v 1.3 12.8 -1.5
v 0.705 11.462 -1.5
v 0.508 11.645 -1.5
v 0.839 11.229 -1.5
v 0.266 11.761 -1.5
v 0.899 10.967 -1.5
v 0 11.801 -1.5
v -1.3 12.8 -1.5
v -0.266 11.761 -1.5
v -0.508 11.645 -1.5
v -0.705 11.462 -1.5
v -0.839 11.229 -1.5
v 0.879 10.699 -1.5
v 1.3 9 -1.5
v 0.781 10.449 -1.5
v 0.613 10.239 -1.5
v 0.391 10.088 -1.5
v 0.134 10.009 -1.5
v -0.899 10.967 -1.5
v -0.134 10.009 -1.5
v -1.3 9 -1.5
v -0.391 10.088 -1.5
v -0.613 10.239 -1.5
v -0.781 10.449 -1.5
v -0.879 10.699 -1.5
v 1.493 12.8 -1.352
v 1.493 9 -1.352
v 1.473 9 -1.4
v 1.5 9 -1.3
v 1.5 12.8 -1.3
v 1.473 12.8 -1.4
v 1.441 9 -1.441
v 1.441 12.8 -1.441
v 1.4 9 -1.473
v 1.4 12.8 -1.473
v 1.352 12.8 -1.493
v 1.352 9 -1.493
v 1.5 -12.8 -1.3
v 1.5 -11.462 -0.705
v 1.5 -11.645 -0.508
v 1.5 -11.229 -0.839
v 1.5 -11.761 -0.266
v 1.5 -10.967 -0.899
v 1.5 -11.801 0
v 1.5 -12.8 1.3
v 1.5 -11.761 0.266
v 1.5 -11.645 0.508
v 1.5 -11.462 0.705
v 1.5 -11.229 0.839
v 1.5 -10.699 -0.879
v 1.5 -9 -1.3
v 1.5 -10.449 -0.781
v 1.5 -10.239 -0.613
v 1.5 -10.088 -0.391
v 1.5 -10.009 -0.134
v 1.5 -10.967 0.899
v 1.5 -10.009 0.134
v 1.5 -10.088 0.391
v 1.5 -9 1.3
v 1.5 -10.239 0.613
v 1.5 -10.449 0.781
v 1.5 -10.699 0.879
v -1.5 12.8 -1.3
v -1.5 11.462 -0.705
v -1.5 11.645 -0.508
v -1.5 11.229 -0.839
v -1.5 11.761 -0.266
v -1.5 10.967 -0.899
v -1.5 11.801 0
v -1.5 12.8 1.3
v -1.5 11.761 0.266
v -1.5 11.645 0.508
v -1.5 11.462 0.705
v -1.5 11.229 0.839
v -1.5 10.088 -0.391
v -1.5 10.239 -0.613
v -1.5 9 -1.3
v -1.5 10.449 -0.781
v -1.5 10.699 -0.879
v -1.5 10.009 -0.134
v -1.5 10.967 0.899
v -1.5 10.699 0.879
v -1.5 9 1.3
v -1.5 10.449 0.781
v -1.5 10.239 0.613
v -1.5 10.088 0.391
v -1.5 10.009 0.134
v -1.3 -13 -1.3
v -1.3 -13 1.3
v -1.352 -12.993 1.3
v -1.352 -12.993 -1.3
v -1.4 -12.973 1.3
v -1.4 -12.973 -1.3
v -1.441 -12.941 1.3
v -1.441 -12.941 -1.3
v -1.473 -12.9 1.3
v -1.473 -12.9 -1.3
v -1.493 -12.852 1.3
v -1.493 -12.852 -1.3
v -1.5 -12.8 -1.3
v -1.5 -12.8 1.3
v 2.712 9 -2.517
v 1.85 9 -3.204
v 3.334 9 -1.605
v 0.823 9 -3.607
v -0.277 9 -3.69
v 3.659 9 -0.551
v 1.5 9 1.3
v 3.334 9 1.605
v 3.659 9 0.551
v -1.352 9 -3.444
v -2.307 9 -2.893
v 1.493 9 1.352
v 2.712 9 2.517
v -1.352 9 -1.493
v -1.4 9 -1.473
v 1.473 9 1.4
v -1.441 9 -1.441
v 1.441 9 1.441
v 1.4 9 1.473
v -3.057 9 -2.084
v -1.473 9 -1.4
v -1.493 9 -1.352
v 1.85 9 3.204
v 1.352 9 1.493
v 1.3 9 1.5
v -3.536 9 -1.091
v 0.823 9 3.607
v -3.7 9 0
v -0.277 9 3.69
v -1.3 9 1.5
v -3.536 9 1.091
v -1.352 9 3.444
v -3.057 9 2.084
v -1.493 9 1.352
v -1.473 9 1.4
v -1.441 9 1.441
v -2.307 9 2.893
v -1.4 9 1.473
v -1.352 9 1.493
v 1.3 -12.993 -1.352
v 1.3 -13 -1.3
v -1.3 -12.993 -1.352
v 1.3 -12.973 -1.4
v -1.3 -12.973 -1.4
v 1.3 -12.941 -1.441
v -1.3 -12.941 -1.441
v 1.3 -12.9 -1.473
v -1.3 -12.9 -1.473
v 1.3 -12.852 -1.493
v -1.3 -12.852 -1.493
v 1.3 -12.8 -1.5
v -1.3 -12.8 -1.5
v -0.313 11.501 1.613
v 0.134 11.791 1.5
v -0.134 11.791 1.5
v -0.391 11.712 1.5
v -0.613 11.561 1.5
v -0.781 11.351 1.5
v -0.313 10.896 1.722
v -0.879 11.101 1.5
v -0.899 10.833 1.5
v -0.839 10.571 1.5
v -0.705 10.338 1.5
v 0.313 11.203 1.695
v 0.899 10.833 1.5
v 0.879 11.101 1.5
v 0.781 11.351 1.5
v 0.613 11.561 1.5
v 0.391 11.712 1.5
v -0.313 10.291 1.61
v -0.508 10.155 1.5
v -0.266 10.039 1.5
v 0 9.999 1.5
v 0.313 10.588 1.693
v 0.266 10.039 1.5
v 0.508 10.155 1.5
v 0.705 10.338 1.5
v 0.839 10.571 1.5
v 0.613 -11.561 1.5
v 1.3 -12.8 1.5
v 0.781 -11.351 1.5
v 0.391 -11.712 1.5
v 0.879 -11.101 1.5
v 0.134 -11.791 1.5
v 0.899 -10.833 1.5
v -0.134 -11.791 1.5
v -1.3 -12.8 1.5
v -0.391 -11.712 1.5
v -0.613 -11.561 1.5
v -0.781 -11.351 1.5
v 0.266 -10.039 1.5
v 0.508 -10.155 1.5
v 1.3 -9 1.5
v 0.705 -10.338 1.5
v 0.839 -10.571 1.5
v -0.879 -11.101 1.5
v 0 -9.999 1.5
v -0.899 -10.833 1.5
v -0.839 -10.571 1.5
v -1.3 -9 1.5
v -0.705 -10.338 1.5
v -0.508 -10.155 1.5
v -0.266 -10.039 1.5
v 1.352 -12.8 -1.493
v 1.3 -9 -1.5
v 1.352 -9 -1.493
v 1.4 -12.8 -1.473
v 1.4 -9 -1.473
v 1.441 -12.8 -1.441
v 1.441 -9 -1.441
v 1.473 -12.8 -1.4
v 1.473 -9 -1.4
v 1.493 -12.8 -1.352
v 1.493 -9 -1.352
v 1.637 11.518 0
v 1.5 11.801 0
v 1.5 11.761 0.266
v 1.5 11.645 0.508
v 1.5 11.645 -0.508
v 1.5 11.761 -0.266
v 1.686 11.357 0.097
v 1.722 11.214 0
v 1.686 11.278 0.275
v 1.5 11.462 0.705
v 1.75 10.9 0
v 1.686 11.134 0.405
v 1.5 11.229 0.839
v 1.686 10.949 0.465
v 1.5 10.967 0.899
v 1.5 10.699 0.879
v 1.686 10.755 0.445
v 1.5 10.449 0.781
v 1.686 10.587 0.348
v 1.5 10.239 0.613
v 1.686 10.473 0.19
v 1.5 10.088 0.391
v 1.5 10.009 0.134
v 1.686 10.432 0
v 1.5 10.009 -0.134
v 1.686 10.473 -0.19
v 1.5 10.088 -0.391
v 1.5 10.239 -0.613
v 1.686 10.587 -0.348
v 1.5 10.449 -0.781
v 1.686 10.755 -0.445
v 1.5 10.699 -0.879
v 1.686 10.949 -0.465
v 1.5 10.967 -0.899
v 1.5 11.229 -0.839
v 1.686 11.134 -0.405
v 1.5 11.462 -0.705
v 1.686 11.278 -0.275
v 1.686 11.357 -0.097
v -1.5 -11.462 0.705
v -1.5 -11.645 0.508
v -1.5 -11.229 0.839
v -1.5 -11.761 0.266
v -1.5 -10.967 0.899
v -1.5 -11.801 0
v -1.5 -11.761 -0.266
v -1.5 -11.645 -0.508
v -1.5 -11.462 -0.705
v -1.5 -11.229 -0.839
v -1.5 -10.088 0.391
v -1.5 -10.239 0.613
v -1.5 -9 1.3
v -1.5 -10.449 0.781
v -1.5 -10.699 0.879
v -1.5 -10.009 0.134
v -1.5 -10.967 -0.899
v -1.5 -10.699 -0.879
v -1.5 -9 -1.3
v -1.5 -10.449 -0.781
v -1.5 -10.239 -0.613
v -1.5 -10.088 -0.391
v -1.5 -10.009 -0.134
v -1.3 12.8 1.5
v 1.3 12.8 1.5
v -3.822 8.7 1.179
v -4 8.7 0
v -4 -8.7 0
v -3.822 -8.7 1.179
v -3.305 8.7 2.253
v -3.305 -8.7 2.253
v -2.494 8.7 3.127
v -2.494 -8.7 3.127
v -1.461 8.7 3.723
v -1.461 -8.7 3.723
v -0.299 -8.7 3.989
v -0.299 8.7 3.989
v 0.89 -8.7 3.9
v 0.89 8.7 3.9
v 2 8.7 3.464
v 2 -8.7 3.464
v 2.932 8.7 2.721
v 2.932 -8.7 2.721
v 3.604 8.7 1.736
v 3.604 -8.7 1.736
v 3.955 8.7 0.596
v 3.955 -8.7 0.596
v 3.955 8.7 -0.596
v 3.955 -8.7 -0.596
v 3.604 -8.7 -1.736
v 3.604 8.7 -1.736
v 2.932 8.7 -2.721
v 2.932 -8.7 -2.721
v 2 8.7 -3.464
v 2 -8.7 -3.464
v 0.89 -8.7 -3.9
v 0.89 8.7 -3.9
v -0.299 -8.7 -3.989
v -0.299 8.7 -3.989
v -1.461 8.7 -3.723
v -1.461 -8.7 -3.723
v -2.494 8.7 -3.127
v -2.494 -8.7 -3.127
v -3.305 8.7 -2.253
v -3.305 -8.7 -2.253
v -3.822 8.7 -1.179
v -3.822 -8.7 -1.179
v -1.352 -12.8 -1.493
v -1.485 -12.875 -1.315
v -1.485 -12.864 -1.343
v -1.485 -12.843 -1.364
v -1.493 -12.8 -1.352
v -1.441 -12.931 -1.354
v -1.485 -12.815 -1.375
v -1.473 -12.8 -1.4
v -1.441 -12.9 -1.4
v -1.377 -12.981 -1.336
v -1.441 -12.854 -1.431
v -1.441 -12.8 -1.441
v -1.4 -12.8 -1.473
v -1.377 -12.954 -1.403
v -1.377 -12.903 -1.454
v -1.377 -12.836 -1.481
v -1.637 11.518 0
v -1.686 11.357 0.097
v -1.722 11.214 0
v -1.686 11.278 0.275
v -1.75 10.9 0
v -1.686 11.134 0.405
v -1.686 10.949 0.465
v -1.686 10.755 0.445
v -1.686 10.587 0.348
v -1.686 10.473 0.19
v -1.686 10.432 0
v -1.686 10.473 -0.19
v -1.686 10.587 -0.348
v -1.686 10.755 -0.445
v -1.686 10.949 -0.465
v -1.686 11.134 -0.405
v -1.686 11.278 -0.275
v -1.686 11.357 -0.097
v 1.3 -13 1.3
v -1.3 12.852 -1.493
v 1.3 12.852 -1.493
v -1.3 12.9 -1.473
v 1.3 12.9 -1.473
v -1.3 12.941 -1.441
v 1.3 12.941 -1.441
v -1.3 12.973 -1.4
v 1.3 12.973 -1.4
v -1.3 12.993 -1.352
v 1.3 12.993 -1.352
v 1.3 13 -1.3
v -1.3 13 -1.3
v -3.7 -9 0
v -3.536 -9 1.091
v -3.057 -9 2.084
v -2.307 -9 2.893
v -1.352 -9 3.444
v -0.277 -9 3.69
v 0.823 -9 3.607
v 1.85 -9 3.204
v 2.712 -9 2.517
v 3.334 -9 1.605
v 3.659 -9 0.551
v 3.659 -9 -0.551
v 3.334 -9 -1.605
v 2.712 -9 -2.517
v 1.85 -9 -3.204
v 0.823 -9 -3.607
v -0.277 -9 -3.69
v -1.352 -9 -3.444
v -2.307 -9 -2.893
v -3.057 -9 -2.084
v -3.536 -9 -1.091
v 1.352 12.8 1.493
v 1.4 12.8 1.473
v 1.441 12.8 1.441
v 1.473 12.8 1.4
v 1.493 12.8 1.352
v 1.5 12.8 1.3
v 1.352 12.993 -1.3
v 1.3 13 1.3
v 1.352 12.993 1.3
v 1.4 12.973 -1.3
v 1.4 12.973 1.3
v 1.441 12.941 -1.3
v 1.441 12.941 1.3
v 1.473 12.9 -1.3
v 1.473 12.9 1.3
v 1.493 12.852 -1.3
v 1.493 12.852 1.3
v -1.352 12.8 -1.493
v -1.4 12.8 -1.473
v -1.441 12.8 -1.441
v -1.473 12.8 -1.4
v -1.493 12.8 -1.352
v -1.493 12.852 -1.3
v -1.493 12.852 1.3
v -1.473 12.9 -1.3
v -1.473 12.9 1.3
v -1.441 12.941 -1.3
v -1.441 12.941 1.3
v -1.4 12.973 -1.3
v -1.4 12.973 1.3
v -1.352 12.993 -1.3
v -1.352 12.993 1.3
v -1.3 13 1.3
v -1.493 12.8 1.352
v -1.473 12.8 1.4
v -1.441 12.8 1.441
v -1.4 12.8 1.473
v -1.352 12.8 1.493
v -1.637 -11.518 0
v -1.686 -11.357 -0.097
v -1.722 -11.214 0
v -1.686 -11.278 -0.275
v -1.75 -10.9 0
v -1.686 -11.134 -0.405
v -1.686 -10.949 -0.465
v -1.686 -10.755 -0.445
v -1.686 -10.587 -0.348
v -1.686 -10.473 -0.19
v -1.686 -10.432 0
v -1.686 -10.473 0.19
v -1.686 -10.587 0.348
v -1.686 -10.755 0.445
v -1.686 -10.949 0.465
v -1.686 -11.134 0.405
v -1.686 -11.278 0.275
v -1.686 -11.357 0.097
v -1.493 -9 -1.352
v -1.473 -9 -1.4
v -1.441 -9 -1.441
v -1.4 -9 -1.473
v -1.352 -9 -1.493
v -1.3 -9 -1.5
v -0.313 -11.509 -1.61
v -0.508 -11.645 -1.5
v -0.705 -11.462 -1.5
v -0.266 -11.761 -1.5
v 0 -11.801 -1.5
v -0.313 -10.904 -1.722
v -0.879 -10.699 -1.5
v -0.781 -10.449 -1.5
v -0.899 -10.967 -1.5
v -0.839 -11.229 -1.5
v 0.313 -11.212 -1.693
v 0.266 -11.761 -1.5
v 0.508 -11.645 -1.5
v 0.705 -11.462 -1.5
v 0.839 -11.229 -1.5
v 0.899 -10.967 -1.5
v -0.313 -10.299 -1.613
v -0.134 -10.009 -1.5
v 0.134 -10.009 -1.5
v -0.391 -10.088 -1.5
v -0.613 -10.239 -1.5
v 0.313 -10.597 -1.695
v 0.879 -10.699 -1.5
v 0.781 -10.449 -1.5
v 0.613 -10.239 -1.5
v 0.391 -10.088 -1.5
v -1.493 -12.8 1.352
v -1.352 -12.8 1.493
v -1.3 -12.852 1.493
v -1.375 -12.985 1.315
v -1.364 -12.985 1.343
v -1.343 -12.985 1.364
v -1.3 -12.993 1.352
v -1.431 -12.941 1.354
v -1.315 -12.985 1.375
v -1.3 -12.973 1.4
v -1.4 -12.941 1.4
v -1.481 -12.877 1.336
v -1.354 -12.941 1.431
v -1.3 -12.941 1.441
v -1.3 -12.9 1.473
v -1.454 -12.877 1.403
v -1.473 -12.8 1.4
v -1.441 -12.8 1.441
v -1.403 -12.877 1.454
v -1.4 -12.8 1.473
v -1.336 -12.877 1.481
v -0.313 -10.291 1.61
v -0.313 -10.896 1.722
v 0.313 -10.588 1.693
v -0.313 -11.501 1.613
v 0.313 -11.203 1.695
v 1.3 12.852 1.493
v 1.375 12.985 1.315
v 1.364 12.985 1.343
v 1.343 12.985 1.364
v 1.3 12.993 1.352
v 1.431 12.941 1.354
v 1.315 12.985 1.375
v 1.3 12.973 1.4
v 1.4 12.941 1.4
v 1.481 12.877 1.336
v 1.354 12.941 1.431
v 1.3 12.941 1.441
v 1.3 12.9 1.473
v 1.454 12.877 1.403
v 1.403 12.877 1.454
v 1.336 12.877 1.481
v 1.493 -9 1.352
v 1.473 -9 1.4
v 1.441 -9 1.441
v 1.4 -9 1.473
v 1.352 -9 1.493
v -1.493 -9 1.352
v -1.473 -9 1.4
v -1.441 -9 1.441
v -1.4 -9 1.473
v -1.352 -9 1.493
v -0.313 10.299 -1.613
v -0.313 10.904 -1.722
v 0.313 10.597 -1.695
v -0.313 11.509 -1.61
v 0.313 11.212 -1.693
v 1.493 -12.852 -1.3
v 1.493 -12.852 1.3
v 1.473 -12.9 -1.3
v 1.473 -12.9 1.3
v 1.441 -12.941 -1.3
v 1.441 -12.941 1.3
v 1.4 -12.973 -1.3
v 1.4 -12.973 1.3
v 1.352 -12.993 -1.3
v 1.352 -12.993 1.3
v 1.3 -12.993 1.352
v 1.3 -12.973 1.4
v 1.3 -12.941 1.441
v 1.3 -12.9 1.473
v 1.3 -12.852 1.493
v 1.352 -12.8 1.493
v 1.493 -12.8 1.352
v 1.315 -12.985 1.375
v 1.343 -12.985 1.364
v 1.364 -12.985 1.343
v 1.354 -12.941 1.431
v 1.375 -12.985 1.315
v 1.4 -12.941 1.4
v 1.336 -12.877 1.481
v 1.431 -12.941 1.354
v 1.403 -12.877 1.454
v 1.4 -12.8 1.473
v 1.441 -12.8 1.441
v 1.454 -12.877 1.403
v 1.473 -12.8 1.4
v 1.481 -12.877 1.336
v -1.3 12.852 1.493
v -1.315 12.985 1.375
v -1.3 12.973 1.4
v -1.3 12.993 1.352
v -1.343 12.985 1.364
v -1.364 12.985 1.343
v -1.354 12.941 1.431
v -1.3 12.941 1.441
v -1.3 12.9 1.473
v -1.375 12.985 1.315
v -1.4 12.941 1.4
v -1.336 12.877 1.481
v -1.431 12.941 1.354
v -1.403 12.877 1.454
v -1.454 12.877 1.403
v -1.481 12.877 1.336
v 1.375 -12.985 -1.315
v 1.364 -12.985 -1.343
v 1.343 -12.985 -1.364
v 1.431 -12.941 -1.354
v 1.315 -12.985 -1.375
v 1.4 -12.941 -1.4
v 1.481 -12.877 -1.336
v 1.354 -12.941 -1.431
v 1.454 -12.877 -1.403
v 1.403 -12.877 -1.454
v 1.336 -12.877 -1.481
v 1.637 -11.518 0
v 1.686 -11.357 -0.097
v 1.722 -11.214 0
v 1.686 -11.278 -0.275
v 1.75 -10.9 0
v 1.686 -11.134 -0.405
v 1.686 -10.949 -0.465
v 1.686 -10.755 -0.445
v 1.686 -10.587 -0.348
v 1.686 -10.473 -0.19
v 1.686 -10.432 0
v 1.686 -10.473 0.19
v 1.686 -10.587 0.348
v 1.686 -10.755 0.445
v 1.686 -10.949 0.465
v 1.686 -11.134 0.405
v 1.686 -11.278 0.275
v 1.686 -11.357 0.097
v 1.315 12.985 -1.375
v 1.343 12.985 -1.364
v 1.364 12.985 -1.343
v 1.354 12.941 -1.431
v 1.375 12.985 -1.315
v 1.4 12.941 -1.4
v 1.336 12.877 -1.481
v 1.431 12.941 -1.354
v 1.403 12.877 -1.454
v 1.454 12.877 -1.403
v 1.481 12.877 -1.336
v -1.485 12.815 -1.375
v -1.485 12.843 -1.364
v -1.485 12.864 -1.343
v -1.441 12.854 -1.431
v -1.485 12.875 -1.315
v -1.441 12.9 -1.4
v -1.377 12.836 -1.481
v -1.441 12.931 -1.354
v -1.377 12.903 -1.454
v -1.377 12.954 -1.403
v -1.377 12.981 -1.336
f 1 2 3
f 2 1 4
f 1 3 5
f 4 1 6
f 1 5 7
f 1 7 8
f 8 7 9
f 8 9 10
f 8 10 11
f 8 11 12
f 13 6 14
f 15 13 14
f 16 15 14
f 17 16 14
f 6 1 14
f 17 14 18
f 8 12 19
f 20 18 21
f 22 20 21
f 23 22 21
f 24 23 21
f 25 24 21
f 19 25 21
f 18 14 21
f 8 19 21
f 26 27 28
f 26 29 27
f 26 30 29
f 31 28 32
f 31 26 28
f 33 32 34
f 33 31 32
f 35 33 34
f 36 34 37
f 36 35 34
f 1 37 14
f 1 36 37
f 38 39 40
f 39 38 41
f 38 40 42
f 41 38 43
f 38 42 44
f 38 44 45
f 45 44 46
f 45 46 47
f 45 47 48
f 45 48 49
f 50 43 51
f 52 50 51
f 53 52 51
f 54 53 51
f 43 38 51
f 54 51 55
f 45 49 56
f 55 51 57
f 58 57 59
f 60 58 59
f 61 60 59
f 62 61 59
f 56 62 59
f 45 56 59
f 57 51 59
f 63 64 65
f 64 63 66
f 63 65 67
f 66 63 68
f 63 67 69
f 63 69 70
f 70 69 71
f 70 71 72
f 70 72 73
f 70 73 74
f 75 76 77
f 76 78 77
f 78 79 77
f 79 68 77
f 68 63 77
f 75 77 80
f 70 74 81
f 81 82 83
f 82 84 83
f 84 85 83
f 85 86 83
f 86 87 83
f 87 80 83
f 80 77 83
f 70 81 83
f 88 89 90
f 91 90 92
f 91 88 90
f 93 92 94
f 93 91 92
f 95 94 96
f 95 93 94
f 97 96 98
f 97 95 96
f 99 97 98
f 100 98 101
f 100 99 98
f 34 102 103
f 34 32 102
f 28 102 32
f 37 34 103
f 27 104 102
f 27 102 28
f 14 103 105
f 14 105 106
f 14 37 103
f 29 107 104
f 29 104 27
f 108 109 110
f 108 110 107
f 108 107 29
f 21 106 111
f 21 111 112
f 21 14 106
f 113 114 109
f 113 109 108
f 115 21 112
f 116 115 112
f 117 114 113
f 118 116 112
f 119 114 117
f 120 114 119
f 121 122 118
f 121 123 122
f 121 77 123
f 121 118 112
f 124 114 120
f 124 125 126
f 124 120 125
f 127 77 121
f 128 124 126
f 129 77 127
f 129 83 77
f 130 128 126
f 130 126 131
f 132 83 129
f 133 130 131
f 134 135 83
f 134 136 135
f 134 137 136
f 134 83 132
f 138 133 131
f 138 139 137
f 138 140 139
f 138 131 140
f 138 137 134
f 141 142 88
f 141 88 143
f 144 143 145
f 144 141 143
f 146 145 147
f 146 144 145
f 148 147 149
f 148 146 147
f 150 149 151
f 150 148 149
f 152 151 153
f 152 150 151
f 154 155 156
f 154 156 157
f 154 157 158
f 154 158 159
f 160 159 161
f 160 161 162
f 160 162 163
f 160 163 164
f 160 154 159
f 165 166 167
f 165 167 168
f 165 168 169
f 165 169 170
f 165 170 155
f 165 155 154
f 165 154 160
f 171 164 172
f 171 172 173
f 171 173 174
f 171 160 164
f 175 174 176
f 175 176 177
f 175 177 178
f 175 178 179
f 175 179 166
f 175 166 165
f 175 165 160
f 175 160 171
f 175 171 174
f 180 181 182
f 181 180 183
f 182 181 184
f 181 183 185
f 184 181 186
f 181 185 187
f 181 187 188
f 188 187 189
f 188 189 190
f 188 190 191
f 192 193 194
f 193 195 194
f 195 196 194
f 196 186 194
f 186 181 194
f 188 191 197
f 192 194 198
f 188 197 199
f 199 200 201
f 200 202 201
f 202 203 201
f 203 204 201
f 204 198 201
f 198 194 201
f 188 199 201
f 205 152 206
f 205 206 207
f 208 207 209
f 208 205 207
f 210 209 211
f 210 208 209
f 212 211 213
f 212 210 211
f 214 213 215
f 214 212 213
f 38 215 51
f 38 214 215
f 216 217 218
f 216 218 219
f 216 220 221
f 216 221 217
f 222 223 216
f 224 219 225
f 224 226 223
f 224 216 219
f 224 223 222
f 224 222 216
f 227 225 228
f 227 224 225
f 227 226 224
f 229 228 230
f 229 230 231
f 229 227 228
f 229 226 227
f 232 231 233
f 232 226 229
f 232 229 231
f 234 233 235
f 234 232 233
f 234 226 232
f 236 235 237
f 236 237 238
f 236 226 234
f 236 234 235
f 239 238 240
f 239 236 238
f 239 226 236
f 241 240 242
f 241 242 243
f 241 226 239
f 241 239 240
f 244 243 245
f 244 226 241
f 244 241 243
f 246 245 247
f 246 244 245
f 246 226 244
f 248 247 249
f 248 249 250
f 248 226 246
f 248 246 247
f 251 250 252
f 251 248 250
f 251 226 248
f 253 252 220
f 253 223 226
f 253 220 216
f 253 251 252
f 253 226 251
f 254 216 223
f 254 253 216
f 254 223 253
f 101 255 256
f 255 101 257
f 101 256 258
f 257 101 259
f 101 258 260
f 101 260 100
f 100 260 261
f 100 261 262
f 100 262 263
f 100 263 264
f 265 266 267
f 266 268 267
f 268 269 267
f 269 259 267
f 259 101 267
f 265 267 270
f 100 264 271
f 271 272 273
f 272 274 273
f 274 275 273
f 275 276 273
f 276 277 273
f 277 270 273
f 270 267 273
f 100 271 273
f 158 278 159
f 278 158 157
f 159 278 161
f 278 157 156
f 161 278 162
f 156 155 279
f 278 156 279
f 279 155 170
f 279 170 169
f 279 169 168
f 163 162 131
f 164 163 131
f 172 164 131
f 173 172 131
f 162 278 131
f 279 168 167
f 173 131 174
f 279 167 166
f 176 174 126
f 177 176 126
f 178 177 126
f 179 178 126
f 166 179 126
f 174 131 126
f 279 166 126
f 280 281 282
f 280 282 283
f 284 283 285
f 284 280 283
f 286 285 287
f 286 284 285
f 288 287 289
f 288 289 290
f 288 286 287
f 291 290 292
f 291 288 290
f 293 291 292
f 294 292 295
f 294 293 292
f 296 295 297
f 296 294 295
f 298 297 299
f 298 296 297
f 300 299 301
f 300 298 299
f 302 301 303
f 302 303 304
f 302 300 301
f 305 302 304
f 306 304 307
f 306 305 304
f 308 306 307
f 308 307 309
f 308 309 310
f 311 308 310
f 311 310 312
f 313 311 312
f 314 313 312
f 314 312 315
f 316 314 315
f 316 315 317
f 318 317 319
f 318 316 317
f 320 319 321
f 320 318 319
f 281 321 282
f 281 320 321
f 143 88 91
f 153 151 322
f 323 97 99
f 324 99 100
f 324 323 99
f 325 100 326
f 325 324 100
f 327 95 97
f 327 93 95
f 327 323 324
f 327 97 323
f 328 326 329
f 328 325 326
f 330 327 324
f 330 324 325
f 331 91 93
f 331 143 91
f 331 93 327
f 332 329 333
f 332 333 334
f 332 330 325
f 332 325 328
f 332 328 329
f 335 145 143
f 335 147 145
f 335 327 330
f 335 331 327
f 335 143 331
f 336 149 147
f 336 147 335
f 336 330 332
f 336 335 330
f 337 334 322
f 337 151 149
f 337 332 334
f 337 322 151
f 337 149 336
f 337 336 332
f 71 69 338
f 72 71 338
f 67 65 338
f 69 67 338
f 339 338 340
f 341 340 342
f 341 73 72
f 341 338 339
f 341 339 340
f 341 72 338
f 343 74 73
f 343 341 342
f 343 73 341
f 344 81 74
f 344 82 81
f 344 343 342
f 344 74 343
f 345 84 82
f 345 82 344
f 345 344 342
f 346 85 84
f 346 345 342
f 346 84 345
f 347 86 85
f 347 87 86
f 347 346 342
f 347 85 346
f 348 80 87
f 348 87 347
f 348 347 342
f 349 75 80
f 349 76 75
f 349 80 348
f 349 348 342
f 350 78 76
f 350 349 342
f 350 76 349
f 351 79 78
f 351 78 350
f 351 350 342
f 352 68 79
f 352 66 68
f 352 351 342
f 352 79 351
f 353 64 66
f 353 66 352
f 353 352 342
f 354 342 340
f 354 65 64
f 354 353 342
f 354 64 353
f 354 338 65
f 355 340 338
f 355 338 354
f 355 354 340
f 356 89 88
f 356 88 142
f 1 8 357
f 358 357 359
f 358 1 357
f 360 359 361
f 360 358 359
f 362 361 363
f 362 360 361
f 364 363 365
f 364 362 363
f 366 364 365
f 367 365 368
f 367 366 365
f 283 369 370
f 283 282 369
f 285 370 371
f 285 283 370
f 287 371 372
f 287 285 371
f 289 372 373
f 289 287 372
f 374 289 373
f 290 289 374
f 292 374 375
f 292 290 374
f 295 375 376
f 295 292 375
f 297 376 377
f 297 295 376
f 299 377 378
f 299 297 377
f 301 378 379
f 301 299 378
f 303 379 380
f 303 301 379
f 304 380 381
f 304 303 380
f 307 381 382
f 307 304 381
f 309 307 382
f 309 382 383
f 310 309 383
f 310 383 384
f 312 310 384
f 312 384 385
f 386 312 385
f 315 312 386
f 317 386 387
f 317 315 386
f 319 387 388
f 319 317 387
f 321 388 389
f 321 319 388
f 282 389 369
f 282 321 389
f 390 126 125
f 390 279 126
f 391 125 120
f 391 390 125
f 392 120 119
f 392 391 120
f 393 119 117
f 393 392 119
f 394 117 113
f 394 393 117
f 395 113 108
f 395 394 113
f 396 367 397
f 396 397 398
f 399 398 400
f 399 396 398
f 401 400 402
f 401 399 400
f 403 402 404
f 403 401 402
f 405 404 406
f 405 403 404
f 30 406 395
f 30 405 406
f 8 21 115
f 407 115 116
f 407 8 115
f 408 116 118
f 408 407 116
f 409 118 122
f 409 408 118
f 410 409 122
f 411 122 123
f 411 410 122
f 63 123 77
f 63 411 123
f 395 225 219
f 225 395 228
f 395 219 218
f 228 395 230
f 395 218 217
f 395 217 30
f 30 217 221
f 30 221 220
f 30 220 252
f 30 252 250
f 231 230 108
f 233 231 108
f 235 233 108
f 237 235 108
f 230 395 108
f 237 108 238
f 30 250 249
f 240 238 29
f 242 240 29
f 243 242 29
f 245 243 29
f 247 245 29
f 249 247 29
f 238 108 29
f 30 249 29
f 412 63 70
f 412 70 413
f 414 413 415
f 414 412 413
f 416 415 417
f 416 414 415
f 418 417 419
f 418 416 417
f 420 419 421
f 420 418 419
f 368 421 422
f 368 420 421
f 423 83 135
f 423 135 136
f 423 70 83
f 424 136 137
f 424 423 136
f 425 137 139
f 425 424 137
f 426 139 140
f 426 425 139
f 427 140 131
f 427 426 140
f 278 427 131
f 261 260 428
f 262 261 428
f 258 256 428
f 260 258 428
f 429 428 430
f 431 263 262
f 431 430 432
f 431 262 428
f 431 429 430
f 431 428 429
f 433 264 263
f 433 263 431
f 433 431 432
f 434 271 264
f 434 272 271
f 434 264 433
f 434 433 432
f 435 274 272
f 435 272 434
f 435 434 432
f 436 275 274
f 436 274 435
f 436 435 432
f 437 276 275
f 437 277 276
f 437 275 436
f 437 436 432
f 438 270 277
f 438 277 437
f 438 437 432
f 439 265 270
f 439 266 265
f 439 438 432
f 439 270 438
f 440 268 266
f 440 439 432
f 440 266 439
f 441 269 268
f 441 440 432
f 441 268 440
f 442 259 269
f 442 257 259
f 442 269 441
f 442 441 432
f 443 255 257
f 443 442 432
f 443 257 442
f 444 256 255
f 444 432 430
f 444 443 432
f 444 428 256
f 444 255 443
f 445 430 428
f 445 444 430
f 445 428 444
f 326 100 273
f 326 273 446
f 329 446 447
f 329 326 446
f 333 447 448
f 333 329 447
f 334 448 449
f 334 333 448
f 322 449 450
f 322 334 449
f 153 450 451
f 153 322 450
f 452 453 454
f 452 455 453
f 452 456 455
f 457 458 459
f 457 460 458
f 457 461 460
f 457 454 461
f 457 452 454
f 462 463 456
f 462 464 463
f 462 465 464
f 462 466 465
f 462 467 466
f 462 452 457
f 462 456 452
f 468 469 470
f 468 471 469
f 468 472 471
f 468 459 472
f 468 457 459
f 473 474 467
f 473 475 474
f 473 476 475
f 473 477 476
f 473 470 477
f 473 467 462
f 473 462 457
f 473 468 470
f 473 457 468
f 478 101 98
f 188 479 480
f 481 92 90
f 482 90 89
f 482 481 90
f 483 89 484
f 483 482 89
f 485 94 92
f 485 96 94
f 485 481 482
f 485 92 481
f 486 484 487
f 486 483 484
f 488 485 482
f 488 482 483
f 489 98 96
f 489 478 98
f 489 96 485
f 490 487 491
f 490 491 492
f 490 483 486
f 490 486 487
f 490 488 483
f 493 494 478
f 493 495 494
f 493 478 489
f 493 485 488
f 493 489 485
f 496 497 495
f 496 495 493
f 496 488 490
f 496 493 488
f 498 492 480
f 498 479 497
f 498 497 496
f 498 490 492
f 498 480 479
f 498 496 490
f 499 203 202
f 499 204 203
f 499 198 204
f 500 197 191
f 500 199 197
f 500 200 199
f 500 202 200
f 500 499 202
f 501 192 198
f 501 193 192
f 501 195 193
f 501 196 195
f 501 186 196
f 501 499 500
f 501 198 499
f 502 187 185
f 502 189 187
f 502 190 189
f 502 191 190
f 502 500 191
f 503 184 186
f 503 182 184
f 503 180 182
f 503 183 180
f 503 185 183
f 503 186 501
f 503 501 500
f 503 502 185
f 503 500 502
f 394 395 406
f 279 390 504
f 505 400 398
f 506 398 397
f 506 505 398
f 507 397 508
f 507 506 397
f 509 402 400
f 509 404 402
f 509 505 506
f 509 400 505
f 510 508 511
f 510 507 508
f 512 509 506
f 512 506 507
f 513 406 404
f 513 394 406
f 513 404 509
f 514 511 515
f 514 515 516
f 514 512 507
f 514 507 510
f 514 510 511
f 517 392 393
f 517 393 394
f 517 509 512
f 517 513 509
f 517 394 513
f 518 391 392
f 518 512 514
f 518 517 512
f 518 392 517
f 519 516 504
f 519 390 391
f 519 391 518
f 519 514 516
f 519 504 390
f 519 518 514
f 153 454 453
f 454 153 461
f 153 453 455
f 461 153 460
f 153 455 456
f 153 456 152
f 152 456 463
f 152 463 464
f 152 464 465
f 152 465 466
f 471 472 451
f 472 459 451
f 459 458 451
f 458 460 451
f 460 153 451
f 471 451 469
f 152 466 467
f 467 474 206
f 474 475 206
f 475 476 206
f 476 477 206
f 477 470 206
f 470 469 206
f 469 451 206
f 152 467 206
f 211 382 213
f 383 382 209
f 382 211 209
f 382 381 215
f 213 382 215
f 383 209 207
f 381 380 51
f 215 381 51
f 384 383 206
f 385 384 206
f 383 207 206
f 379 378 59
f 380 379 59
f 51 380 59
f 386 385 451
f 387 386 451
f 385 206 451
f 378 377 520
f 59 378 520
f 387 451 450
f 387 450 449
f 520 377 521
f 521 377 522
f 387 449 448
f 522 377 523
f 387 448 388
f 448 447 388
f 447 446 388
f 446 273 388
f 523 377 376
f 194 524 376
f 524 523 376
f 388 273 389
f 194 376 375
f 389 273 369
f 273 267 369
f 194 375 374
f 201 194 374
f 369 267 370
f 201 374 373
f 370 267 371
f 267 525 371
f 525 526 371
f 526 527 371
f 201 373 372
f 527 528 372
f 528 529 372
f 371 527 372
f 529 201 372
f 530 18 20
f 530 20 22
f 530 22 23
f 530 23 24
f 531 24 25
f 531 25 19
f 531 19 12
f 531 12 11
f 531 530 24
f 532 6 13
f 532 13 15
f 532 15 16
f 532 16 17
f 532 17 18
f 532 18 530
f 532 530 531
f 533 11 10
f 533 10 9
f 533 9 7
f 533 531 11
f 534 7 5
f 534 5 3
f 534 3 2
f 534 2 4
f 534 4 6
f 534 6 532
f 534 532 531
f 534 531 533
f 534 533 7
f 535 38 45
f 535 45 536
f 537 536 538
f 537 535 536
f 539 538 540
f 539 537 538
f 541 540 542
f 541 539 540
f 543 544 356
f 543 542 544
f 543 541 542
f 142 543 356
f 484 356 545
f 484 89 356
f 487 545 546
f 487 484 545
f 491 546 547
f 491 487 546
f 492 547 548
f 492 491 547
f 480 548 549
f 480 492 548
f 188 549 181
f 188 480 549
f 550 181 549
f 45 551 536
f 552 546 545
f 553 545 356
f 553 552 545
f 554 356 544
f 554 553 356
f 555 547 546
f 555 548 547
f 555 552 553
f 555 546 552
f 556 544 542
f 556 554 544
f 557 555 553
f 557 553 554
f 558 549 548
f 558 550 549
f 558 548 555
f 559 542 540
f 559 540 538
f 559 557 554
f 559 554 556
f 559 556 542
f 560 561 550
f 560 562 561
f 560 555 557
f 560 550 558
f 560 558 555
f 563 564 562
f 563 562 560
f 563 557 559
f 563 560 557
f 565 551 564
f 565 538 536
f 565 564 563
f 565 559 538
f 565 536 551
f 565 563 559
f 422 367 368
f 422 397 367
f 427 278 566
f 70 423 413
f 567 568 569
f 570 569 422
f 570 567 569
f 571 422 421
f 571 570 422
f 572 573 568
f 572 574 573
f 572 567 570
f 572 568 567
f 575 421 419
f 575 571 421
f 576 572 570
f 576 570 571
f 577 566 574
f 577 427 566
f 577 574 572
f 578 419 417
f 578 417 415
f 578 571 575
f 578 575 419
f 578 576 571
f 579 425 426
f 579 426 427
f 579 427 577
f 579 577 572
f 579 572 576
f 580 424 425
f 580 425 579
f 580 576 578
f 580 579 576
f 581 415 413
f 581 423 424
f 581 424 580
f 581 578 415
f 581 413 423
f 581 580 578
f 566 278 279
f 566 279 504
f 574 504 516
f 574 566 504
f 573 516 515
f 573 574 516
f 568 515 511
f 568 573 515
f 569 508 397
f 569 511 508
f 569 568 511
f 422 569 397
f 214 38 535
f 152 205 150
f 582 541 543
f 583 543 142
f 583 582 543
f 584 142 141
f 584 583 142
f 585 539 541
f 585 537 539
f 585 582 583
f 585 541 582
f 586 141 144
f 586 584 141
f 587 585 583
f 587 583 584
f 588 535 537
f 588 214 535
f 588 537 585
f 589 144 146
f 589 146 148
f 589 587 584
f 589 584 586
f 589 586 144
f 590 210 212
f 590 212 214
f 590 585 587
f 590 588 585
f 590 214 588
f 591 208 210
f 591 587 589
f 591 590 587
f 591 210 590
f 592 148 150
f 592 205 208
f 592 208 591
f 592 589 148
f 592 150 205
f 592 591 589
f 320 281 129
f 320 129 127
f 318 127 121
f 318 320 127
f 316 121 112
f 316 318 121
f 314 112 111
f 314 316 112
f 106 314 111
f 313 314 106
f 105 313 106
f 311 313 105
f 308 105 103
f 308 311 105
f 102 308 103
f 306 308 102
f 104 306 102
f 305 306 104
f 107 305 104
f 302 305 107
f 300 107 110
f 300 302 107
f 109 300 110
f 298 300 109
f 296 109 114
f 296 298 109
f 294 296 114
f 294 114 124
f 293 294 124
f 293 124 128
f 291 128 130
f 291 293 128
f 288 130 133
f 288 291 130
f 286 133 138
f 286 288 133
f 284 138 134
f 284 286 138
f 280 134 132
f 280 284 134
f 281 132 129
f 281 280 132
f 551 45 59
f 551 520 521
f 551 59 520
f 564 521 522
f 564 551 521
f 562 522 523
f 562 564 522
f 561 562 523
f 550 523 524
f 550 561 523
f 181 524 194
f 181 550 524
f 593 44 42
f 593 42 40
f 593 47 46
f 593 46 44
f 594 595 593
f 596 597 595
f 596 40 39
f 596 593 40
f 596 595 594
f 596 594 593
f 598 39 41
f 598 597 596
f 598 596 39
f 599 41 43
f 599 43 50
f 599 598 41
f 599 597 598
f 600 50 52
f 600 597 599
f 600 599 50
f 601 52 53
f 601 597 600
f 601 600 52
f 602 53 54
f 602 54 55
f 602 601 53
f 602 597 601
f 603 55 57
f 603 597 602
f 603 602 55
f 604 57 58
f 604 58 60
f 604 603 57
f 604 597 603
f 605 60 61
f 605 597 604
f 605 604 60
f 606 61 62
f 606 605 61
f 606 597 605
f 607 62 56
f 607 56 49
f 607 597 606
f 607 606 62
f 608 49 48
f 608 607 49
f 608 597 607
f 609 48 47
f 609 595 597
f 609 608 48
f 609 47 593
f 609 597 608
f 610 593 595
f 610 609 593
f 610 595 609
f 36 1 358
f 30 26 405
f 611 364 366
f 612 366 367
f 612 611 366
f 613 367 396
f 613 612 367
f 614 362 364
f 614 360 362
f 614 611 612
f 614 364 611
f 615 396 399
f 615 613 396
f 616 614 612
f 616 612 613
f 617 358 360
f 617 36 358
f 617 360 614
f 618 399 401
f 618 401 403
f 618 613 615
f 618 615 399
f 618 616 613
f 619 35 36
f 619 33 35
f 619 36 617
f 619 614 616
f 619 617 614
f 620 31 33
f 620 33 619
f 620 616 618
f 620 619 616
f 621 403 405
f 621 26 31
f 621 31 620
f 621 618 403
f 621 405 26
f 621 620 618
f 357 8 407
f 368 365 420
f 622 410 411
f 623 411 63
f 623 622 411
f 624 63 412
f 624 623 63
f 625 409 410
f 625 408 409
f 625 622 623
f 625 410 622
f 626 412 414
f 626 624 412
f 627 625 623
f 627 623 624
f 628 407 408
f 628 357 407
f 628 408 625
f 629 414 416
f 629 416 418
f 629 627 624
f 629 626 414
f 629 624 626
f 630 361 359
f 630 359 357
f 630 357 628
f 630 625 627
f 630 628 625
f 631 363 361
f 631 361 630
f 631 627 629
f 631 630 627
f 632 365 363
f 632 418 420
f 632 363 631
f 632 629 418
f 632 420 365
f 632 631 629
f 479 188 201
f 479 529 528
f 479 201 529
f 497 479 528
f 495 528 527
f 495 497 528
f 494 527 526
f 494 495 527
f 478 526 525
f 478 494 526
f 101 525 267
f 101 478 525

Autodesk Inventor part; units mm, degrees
ref_plane "YZ Plane" through (0, 0, 0) normal (1, 0, 0) x (0, 1, 0)
ref_plane "XZ Plane" through (0, 0, 0) normal (0, 1, 0) x (-1, 0, 0)
sketch "Sketch1" plane through (0, 0, 0) normal (0, 1, 0) x (-1, 0, 0)
  circle A0 centre (0, 0) radius 4
  dimension "d0" = 8
extrude "Extrusion1" add sketch "Sketch1" against normal mid plane 18
sketch "Sketch2" plane through (0, -9, 0) normal (0, -1, 0) x (1, 0, 0)
  circle A0 centre (0, 0) radius 4 projected
  line L0 (-5.6, 0) -> (5.6, 0) projected
  line L1 (-1.5, -1.5) -> (1.5, -1.5)
  line L2 (1.5, -1.5) -> (1.5, 1.5)
  line L3 (1.5, 1.5) -> (-1.5, 1.5)
  line L4 (-1.5, 1.5) -> (-1.5, -1.5)
  dimension "d3" = 3
  dimension "d4" = 3
  dimension "d5" = 1.5
  dimension "d6" = 1.5
extrude "Extrusion2" add sketch "Sketch2" along normal blind 4 contours L2 L1 L4 L0 | L0 L4 L3 L2
fillet "Fillet1" radius 0.2 8 edges at (1.5, -11, 1.5) (-1.5, -11, 1.5) (1.5, -11, -1.5) (0, -13, -1.5) (-1.5, -13, 0) (0, -13, 1.5) (1.5, -13, 0) (-1.5, -11, -1.5)
sketch "Sketch3" plane through (0, 0, 0) normal (0, 0, 1) x (1, 0, 0)
  line L0 (0, -4.8) -> (0, 0)
  line L1 (2.8, 0) -> (2.8, -4.8)
  arc A0 (-0.35, -2.4) -> (3.15, -2.4) centre (1.4, -2.4) ccw
  line L2 (0, -2.4) -> (2.8, -2.4) construction
  line L3 (-4, -9) -> (-4, 9) projected
  line L4 (-4, 9) -> (4, 9) projected
  line L5 (4, 9) -> (4, -9) projected
  line L6 (4, -9) -> (1.5, -9) projected
  line L7 (1.5, -9) -> (1.5, -12.8) projected
  arc A1 (1.3, -13) -> (1.5, -12.8) centre (1.3, -12.8) ccw projected
  line L8 (1.3, -13) -> (-1.3, -13) projected
  arc A2 (-1.5, -12.8) -> (-1.3, -13) centre (-1.3, -12.8) ccw projected
  line L9 (-1.5, -12.8) -> (-1.5, -9) projected
  line L10 (-1.5, -9) -> (-4, -9) projected
  line L11 (-1.5, -10.9) -> (1.5, -10.9) construction
  arc A3 (-1.75, -10.9) -> (1.75, -10.9) centre (0, -10.9) ccw
  line L12 (1.5, -10.9) -> (2.2631, -10.9) construction
  line L13 (-1.5, -10.9) -> (-1.9787, -10.9) construction
  line L14 (-1.75, -10.9) -> (1.75, -10.9)
  point P0 (1.4, -2.4)
  dimension "d10" = 1.75
  dimension "d11" = 3.5
revolve "Revolution1" add sketch "Sketch3" angle 360 about axis through (1.5, -10.9, 0) along (1, 0, 0) contours L14 L7 A3 L9 | L9 A3 L14 | L14 A3 L7
mirror "Mirror1" about plane through (0, 0, 0) normal (0, 1, 0) of "Extrusion2", "Revolution1", "Fillet1"
chamfer "Chamfer2" distance 0.3 angle 45 2 edges at (4, -9, 0) (4, 9, 0)
ref_plane "Work Plane2" through (0, 3.5617, 0) normal (0, -1, 0) x (1, 0, 0)
split_face "Split2"
equation "\"d3\" = d4"
equation "\"d5\" = 0.5 * d4"
equation "\"d6\" = 0.5 * d4"
properties part number "473-01" material "Steel"
